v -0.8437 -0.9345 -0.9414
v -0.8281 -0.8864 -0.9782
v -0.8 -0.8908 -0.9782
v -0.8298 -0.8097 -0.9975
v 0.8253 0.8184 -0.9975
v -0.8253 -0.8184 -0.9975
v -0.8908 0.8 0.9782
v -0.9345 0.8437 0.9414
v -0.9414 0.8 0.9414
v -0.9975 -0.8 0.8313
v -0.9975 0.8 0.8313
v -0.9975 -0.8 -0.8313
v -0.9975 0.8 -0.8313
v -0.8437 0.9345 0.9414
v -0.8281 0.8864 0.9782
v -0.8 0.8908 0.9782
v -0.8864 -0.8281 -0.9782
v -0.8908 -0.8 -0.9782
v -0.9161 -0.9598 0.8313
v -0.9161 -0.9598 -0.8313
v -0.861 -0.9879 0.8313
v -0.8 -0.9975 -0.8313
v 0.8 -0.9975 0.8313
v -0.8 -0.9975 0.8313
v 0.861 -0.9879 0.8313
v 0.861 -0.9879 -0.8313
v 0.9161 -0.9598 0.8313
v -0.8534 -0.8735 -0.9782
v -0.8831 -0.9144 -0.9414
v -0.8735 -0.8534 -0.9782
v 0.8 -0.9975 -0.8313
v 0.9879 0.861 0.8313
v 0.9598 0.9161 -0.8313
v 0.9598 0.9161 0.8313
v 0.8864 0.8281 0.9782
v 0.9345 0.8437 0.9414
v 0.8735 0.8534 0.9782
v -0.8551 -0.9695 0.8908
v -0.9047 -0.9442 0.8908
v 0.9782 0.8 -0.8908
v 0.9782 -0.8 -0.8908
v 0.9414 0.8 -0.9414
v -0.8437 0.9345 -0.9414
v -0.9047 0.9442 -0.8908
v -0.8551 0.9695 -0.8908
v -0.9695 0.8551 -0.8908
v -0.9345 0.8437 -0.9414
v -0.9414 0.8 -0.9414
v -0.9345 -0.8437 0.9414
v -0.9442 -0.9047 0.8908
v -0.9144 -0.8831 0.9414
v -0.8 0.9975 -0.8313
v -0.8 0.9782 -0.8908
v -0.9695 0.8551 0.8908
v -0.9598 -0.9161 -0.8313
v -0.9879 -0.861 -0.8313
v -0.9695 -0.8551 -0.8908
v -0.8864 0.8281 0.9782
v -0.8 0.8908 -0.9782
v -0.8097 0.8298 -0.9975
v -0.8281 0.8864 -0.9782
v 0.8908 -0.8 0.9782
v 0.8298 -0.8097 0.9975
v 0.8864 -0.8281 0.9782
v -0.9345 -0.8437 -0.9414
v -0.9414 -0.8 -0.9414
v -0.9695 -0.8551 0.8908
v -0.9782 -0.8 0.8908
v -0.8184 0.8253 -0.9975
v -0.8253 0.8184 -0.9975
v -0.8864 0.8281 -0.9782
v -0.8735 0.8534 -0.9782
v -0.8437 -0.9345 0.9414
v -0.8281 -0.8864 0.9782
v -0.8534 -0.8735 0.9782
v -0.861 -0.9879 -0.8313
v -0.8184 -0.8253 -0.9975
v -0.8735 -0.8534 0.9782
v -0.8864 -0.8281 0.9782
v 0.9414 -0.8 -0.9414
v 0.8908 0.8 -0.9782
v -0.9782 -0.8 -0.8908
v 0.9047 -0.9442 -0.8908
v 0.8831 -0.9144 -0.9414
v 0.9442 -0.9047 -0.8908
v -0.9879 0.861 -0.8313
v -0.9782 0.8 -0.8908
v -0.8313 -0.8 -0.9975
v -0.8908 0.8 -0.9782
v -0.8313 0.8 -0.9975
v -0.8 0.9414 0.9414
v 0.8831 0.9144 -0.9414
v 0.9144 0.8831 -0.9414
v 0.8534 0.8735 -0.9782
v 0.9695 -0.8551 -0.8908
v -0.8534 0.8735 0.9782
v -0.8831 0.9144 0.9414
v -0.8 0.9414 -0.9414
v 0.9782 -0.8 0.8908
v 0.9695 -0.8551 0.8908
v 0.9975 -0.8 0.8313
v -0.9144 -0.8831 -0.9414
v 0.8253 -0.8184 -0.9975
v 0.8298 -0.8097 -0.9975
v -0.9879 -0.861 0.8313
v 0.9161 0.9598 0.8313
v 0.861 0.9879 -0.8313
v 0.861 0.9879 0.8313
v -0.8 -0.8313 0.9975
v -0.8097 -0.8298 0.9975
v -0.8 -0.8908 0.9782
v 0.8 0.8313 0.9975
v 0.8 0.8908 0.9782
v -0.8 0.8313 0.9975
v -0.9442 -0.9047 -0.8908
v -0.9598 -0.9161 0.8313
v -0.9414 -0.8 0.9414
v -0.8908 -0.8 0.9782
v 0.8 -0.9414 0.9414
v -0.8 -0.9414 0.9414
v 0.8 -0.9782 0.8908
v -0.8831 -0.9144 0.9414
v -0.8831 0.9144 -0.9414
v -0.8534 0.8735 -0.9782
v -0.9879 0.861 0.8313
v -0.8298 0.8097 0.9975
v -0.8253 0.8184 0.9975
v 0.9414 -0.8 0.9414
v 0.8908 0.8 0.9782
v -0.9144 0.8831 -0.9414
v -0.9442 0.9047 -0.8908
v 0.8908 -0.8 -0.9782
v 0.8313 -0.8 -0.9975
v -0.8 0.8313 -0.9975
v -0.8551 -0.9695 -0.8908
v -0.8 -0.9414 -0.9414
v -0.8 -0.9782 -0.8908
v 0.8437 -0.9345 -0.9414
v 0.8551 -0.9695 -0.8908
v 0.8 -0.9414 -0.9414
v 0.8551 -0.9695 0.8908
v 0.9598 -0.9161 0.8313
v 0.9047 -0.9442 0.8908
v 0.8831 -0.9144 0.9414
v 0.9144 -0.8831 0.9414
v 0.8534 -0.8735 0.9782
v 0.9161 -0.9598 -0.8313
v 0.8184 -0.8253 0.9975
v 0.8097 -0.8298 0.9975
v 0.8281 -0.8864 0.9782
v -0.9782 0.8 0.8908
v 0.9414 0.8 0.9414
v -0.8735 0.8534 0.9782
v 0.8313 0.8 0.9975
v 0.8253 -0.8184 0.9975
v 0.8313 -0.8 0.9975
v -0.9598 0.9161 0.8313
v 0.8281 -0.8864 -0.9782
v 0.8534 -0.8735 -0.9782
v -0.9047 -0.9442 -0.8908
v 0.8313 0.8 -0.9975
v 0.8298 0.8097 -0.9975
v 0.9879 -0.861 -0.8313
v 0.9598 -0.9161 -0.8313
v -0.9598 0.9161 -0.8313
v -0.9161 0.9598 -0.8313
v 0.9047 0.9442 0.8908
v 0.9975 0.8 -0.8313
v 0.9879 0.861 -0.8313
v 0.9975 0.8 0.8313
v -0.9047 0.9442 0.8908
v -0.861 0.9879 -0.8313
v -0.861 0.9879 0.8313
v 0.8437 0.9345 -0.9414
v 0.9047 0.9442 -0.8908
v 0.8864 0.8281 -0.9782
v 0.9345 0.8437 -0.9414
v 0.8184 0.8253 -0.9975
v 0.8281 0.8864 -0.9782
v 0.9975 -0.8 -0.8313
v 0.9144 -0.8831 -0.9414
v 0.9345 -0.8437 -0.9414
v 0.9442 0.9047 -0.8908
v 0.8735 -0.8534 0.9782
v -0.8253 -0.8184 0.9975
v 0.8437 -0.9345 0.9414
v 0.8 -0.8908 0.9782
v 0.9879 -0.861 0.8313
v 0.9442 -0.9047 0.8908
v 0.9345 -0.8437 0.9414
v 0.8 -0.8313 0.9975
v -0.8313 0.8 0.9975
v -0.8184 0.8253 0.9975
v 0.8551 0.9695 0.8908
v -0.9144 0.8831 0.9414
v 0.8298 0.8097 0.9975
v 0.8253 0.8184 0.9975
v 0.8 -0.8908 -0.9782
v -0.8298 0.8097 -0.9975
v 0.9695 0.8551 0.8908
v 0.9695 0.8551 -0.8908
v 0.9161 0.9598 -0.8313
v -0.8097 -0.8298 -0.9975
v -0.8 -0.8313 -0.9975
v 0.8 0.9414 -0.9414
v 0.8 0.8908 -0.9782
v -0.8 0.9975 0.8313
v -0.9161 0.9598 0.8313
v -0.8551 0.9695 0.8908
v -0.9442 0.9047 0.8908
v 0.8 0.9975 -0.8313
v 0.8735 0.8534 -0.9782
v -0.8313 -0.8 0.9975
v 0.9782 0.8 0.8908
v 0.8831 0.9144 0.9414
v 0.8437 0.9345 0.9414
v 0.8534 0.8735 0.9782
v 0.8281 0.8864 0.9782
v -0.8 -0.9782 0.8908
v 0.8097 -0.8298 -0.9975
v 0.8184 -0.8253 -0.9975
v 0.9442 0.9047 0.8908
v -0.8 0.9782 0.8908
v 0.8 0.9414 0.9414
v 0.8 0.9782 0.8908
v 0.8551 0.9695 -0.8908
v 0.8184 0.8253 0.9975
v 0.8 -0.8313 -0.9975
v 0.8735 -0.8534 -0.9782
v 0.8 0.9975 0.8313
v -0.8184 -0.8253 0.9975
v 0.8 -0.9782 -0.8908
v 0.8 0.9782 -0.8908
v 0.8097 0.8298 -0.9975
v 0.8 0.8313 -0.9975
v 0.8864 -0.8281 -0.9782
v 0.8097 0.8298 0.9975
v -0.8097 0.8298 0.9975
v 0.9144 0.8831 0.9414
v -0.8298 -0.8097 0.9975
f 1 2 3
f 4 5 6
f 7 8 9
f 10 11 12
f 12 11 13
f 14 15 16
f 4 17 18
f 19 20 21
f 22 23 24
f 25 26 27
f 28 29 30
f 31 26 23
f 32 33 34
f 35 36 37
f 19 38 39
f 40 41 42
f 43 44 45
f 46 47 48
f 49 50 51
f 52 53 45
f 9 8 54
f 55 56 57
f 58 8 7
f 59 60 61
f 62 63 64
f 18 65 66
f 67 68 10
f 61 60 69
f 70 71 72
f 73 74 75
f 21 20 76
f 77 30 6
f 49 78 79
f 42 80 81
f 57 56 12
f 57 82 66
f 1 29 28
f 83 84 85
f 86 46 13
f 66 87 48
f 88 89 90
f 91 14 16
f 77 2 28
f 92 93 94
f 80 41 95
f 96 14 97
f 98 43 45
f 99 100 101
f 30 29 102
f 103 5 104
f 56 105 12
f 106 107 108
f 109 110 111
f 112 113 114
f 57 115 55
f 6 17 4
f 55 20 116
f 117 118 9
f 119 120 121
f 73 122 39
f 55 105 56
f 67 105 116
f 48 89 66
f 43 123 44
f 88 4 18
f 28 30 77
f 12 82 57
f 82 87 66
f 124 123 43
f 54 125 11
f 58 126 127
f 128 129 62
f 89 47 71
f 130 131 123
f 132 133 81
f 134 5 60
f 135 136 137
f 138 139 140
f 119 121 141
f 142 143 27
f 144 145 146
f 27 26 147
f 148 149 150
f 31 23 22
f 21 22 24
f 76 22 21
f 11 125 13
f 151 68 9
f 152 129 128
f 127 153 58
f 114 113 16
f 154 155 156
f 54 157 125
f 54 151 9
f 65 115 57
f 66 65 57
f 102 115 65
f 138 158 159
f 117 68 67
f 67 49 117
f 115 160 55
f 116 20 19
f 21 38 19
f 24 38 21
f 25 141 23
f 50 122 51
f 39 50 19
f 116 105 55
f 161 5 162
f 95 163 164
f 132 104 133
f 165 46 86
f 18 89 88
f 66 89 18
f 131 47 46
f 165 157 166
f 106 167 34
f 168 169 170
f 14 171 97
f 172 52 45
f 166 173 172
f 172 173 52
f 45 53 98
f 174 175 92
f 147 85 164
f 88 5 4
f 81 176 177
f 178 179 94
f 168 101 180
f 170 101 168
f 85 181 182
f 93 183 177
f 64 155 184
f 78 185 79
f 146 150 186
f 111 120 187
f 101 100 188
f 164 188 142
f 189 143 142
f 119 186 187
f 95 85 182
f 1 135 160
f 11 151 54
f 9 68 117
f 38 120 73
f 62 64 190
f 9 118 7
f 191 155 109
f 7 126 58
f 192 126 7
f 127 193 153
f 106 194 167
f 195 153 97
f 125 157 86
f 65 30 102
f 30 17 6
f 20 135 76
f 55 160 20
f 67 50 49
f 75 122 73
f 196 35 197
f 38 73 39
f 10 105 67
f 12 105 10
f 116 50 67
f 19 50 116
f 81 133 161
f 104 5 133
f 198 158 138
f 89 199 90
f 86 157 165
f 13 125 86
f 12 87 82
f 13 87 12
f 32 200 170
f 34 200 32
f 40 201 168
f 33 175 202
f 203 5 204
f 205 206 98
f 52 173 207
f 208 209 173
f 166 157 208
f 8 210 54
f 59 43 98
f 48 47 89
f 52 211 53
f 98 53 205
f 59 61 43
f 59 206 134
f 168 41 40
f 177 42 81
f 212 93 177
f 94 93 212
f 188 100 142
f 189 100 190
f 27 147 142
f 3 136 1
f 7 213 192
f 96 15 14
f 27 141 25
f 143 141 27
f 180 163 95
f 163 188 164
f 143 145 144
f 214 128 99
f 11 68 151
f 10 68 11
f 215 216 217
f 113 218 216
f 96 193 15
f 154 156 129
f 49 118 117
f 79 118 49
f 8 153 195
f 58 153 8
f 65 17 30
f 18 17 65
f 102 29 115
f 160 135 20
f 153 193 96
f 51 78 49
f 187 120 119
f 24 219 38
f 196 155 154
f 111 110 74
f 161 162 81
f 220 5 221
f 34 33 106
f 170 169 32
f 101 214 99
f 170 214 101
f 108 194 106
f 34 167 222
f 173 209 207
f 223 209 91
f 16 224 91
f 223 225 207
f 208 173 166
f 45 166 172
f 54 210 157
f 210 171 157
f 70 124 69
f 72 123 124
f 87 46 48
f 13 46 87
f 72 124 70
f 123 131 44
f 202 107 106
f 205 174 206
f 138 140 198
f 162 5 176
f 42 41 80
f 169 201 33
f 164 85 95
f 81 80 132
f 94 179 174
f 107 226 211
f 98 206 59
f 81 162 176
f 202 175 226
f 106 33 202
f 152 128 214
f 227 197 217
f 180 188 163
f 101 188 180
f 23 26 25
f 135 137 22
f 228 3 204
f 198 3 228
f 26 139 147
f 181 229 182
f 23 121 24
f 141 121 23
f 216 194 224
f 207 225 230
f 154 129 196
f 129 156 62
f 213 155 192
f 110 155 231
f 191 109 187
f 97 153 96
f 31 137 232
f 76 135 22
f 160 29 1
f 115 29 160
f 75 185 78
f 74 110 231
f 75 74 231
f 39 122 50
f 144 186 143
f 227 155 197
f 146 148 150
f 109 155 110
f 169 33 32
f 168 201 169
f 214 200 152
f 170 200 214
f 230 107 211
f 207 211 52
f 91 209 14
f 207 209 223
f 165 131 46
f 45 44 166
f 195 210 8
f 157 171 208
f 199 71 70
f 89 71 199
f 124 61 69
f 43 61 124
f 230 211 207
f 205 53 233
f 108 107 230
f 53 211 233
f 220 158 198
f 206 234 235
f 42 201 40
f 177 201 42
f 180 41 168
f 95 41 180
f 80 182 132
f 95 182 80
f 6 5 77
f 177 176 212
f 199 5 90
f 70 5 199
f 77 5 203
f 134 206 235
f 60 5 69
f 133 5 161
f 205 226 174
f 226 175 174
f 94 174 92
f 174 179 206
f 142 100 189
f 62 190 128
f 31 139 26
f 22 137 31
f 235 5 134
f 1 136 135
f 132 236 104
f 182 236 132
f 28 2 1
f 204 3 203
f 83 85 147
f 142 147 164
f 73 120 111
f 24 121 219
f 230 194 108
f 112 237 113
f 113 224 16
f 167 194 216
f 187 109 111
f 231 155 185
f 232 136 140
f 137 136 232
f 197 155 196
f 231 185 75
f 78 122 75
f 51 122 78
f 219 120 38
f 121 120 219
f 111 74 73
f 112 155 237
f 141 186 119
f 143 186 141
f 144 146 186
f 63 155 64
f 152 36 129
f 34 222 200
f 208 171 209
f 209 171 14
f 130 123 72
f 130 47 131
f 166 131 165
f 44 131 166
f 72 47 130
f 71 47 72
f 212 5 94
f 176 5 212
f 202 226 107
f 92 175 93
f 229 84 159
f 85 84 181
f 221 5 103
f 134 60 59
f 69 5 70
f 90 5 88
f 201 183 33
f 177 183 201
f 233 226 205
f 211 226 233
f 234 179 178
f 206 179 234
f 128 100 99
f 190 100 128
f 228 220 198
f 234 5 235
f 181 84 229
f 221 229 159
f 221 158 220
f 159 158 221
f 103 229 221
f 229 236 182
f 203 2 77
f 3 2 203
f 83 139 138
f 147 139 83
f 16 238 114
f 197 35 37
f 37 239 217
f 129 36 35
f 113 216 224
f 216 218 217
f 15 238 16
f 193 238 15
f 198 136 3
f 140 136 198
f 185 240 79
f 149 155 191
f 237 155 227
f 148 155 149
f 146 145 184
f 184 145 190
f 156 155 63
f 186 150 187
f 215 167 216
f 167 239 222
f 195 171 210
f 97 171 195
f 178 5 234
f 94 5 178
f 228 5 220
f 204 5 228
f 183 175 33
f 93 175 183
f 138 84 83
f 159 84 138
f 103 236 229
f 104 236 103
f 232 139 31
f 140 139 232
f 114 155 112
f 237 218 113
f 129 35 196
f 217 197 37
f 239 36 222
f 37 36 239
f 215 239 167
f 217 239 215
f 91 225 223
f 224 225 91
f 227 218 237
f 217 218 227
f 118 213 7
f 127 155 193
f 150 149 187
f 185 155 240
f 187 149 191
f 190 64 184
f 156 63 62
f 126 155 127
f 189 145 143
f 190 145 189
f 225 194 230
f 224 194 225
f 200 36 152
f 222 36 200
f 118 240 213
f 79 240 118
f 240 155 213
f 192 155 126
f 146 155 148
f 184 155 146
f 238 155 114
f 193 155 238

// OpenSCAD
roundedness = 0.2; 
diameter = 2;

module rounded_cube(length,roundedness){
	minkowski(){
		cube(size=length*(1-roundedness),center=true);
		sphere(d=length*roundedness,$fn=20);}}

rounded_cube(diameter,roundedness);
